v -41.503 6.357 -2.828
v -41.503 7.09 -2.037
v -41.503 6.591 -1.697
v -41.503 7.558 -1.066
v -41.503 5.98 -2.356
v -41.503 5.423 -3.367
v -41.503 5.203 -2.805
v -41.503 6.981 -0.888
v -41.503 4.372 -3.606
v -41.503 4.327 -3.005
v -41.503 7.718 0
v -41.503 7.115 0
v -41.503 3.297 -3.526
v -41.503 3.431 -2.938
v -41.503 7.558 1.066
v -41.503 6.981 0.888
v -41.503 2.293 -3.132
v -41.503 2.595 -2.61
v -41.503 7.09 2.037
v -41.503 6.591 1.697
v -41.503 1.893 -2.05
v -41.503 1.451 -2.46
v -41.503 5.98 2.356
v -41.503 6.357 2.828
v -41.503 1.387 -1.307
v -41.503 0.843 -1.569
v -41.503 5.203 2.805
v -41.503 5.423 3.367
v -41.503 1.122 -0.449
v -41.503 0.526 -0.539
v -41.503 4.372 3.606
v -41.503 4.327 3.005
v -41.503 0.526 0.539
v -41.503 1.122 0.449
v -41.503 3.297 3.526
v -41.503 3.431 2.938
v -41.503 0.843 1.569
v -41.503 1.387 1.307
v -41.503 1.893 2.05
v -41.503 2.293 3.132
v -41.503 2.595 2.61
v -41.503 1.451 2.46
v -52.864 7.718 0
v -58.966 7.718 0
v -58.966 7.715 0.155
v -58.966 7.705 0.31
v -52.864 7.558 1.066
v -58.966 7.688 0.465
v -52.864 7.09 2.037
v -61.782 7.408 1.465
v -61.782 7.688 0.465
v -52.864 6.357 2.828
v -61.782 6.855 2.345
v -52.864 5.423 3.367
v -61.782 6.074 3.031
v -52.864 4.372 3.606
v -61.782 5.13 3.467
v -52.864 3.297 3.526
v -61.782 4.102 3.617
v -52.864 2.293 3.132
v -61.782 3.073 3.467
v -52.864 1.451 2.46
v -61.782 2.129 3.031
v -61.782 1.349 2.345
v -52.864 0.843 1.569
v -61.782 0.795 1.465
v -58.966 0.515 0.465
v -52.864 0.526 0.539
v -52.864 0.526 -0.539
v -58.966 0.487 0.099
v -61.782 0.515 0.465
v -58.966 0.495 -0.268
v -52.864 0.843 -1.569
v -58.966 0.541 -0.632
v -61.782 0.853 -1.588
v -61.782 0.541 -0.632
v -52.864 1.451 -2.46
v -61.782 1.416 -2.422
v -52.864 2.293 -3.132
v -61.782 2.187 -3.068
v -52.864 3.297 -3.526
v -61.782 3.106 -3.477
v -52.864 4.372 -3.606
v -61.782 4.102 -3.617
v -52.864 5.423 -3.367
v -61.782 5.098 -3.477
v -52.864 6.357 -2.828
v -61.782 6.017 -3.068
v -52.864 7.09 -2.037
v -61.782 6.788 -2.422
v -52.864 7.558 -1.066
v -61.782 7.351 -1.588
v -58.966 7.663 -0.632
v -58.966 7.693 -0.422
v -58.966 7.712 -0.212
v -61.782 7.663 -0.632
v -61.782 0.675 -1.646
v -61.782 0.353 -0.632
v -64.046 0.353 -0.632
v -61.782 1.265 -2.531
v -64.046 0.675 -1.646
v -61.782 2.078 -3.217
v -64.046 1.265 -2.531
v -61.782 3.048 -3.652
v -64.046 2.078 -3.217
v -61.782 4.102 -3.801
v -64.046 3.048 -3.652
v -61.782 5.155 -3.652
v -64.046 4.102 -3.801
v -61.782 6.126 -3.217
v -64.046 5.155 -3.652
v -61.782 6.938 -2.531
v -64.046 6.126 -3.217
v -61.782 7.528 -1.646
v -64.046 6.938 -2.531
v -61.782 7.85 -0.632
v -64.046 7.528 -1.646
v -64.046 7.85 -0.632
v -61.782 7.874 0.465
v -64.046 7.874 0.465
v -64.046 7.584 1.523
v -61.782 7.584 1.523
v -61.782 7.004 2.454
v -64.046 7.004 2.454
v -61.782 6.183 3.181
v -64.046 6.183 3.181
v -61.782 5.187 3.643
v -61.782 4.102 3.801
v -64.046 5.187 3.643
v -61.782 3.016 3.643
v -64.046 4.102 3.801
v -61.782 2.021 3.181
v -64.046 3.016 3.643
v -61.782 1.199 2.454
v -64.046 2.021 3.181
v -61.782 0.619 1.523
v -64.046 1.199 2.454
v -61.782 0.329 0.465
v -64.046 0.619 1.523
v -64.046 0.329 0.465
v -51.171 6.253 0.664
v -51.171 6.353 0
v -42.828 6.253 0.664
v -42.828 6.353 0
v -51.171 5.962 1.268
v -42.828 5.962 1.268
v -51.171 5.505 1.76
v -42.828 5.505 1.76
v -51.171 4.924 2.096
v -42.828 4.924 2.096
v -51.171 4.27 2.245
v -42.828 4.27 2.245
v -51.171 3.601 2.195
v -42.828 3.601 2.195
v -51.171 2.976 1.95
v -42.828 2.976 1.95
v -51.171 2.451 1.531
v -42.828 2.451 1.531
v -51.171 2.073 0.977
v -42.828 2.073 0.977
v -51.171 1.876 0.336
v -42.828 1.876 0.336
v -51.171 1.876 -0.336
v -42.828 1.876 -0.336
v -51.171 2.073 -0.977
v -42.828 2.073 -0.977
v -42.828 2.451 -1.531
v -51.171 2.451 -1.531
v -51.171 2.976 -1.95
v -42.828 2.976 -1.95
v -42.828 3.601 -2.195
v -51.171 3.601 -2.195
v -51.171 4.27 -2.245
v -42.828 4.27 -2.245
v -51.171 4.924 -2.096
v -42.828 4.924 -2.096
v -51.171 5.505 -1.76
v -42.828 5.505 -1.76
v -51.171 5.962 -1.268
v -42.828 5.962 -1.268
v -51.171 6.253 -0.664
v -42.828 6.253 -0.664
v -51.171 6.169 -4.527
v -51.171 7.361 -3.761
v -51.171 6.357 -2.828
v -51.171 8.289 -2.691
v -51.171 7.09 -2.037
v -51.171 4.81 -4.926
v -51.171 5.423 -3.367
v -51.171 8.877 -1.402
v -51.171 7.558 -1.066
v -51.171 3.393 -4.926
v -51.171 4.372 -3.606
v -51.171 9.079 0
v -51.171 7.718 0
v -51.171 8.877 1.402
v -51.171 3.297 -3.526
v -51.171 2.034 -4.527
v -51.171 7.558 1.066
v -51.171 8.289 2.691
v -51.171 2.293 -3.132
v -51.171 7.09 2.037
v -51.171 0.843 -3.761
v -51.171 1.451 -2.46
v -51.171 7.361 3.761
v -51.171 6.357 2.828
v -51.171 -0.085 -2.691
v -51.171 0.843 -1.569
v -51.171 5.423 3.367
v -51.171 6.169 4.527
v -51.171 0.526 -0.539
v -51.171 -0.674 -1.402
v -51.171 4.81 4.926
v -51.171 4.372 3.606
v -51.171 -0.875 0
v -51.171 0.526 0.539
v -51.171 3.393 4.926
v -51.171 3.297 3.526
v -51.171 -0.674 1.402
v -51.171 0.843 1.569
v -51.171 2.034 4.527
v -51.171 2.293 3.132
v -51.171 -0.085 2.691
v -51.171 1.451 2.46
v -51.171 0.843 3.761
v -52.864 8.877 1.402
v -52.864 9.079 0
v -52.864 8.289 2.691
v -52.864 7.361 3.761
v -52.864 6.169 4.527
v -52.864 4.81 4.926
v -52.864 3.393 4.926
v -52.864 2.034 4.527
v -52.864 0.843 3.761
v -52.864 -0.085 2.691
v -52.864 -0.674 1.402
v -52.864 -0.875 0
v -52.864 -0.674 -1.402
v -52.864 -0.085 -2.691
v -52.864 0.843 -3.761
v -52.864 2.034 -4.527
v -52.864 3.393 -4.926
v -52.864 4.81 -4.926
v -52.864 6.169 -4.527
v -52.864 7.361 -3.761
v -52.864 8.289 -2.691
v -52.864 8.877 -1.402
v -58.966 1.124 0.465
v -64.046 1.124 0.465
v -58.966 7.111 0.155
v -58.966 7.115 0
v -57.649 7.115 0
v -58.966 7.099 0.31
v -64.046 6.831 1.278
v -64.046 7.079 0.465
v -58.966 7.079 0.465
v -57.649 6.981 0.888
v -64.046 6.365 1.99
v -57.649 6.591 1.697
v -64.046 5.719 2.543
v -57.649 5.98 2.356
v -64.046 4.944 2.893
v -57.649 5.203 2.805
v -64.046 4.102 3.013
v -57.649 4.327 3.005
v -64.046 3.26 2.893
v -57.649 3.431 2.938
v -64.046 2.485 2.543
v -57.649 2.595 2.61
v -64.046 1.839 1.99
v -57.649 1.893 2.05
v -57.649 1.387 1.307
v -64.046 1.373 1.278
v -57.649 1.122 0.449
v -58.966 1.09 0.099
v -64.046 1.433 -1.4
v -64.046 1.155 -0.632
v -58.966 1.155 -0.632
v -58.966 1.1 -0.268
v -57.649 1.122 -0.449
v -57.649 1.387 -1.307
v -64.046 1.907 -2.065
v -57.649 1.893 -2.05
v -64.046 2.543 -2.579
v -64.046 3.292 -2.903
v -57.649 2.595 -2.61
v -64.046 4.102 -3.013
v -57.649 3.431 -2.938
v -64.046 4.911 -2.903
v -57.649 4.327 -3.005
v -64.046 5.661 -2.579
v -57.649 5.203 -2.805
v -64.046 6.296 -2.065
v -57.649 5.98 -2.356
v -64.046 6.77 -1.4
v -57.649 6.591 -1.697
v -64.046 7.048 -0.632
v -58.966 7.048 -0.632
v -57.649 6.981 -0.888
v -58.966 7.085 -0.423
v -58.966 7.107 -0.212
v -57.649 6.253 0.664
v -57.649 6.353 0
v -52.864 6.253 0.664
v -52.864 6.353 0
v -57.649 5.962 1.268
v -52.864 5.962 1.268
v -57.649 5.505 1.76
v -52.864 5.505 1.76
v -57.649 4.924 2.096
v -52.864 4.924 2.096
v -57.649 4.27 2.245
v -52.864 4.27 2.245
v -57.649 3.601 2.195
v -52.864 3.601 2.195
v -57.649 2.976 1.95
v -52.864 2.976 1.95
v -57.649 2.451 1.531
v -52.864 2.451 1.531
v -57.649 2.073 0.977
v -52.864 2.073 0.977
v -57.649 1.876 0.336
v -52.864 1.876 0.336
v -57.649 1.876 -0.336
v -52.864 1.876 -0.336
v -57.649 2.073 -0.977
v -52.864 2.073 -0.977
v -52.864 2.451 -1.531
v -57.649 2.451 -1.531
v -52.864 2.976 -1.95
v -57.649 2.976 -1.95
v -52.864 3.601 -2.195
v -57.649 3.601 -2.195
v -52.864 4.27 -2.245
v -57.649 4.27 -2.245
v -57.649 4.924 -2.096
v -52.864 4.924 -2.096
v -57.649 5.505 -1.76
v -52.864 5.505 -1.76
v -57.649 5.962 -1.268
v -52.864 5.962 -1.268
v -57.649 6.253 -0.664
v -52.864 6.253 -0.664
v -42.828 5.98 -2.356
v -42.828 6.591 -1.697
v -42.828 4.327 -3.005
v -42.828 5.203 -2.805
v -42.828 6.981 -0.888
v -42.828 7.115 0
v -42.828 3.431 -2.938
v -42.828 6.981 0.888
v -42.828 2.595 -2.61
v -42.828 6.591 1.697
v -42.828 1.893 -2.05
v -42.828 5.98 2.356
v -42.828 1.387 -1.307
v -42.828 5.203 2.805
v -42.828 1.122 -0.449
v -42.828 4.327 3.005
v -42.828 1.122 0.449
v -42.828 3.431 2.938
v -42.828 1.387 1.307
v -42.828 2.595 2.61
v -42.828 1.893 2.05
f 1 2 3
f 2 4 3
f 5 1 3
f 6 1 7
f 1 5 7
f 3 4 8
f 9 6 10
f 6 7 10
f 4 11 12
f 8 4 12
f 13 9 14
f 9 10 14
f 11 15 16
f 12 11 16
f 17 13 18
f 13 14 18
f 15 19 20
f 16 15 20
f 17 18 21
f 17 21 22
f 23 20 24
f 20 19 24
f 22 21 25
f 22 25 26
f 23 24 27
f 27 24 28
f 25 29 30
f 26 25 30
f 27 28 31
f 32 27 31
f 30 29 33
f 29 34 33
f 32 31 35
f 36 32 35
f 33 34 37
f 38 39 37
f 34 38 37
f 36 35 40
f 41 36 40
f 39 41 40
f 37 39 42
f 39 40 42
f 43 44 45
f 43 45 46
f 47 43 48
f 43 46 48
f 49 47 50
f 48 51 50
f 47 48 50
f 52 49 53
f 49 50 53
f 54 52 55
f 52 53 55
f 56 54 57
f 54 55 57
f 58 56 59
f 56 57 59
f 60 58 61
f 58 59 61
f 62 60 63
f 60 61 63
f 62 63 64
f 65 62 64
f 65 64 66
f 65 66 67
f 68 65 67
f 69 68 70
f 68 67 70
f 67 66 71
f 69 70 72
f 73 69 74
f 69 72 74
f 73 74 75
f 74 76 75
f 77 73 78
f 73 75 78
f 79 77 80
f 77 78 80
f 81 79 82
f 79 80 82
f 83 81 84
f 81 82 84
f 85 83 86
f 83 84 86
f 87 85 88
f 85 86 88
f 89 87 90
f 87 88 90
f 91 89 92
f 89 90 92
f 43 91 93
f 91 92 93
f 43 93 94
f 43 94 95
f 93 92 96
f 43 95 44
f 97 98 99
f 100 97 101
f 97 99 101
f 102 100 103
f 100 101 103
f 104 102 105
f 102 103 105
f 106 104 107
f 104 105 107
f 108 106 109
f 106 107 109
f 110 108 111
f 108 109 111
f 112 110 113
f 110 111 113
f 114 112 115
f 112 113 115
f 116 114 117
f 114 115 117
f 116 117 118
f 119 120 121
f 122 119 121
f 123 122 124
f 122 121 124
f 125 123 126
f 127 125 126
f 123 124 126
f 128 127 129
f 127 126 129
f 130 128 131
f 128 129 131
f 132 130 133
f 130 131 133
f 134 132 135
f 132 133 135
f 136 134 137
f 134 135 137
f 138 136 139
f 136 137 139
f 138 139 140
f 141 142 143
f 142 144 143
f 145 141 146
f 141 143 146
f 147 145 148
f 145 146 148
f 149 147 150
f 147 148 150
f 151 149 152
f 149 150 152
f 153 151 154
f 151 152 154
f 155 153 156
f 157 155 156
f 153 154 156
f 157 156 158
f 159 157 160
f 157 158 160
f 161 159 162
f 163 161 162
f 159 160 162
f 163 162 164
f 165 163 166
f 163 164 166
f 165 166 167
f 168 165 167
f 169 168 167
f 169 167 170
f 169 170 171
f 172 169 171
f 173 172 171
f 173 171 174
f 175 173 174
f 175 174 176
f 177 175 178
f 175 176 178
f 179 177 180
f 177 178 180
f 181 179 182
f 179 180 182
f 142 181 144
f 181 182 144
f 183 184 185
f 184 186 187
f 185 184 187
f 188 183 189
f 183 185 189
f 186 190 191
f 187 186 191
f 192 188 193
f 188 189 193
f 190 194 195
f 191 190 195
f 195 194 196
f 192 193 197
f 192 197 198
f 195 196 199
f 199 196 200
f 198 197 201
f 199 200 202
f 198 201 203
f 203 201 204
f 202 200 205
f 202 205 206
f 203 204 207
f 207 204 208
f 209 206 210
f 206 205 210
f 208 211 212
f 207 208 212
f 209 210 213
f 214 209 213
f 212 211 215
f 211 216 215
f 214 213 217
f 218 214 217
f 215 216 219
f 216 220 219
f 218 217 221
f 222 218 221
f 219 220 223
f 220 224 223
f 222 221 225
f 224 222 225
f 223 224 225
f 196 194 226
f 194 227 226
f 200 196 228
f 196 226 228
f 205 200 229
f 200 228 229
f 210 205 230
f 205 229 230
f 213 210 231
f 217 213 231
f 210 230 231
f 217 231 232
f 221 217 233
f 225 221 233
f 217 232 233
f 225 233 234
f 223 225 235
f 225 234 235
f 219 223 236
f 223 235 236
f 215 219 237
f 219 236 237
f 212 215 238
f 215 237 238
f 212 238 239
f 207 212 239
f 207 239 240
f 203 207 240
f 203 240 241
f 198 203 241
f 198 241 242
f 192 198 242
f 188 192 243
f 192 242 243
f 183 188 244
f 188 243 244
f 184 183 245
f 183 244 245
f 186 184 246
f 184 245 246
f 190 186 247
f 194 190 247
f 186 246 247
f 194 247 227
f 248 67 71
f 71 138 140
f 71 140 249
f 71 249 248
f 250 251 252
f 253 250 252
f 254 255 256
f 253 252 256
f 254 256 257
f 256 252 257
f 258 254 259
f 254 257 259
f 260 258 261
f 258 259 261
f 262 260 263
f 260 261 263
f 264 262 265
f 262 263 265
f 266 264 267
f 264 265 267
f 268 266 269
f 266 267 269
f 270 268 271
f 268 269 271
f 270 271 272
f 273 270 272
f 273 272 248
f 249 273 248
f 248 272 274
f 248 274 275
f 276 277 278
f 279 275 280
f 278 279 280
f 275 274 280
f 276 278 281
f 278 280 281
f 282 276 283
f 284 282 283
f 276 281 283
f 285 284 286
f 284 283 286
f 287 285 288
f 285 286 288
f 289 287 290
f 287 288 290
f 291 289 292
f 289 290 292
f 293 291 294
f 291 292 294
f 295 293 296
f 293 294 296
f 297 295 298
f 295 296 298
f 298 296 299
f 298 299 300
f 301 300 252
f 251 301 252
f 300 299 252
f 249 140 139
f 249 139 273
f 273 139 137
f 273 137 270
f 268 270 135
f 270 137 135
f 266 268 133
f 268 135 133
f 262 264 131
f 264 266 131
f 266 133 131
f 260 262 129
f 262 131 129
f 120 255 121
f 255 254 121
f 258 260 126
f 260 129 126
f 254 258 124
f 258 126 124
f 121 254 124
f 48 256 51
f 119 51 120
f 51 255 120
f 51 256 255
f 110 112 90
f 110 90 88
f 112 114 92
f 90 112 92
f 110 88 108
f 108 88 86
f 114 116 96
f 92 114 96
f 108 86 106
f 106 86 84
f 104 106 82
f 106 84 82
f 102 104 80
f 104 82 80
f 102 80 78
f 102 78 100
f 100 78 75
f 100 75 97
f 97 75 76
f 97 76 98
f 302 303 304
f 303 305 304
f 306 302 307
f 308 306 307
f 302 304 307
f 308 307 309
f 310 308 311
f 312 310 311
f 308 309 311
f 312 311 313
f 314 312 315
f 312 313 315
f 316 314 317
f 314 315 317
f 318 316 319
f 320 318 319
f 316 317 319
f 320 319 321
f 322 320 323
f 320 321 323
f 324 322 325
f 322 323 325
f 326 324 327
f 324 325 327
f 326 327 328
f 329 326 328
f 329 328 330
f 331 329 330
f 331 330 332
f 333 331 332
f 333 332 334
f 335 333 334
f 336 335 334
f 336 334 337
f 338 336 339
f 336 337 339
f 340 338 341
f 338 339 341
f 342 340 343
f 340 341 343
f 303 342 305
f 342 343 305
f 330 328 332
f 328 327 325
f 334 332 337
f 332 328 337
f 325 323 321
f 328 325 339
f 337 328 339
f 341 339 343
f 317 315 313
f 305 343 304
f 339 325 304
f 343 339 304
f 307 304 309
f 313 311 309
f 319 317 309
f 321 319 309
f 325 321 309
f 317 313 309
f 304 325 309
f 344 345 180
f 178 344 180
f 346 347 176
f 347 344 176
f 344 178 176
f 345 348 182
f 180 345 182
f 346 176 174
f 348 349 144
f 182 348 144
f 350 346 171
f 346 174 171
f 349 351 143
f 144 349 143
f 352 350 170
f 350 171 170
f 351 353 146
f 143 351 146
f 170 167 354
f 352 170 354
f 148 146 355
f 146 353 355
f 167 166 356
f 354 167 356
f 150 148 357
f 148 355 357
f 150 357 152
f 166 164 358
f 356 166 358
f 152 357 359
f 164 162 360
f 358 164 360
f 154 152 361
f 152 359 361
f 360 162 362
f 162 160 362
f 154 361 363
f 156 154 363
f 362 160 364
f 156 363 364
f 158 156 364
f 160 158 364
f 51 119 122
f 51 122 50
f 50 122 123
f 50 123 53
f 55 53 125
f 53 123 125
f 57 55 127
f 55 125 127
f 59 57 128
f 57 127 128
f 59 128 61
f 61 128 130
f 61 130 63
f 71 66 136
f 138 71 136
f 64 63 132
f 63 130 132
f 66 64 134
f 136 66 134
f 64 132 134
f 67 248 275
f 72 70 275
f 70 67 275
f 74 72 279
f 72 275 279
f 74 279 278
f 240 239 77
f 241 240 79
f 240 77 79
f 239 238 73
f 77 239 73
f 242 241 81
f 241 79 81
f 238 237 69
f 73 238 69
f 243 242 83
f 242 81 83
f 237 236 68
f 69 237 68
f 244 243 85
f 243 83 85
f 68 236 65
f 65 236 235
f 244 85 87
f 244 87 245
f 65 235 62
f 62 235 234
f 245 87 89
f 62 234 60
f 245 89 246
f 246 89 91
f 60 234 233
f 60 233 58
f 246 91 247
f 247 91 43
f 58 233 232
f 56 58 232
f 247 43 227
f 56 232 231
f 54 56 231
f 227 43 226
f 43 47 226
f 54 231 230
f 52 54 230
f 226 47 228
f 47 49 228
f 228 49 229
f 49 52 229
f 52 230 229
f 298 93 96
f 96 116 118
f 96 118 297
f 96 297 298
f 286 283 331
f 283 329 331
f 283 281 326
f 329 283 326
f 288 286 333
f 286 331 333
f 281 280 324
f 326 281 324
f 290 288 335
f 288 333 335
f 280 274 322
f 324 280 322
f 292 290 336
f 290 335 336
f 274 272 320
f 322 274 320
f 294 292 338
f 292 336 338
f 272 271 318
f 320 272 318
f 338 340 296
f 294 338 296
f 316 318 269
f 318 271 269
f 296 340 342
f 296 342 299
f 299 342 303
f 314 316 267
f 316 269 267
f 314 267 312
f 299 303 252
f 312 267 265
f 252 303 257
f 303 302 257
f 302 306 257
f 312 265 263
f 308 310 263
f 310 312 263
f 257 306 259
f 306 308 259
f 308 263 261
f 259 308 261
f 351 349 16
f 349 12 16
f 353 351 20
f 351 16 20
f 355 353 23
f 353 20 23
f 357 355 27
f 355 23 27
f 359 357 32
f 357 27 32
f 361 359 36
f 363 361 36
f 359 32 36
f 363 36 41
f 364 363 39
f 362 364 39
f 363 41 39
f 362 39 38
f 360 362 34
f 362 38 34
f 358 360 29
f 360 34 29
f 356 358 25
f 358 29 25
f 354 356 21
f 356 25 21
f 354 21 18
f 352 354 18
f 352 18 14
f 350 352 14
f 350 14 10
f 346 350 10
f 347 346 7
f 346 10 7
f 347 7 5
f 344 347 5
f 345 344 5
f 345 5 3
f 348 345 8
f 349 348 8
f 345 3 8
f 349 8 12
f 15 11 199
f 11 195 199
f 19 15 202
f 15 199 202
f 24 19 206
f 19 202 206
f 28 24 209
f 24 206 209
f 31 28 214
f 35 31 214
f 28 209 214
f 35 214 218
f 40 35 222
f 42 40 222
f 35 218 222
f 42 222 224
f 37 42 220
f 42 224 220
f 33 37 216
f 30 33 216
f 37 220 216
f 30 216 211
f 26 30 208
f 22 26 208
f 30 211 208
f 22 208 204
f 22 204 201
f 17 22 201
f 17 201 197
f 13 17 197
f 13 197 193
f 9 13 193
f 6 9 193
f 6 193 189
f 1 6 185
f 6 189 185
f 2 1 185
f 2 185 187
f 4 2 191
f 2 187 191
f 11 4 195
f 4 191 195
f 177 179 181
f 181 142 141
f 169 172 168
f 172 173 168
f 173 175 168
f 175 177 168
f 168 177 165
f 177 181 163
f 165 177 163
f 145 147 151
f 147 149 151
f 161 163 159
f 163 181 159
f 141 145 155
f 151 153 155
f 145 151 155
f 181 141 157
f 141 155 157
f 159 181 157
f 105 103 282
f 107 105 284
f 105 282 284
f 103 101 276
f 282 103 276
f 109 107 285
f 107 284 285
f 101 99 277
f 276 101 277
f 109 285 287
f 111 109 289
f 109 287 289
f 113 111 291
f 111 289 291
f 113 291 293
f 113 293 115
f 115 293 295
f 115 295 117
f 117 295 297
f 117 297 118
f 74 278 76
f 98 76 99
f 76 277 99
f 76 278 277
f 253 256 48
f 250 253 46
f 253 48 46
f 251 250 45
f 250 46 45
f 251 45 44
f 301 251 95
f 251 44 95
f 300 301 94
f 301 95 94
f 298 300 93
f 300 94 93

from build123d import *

# Parameters (mm, degrees)
CUT_EXTRUDE1_DEPTH = 5.08


with BuildPart() as part:
    # Sketch1 → Revolve3 (revolve)
    with BuildSketch(Plane.XY):
        Polygon((-64.046377149, 7.114962412), (-57.649439031, 7.114962412), (-57.649439031, 6.352962412), (-52.863745559, 6.352962412), (-52.863745559, 4.101714874), (-51.170838104, 4.101714874), (-51.170838104, 6.352962412), (-42.828401085, 6.352962412), (-42.828401085, 7.114962412), (-41.502858565, 7.114962412), (-41.502858565, 7.718234779), (-51.170838104, 7.718234779), (-51.170838104, 9.078659997), (-52.863745559, 9.078659997), (-52.863745559, 7.718234779), (-54.862931861, 7.718234779), (-55.961416497, 7.718234779), (-58.85700077, 7.718234779), (-59.483688957, 7.718234779), (-61.781937161, 7.718234779), (-61.781937161, 7.902812446), (-64.046377149, 7.902812446), align=None)
    revolve(axis=Axis((-52.863745559, 4.101714874, 0), (1, 0, 0)))

    # Sketch4 → Cut-Extrude1 (cut)
    with BuildSketch(Plane.ZY.offset(64.046377149)):
        Polygon((-0.631646969, 7.849963113), (-0.631646969, 8.219502832), (0.464537278, 8.219502832), (0.464537278, 7.849963113), (0.464537278, 0.329109955), (-0.370144054, 0), (-0.631646969, 0.329109955), align=None)
    extrude(amount=-CUT_EXTRUDE1_DEPTH, mode=Mode.SUBTRACT)


solid = part.part
